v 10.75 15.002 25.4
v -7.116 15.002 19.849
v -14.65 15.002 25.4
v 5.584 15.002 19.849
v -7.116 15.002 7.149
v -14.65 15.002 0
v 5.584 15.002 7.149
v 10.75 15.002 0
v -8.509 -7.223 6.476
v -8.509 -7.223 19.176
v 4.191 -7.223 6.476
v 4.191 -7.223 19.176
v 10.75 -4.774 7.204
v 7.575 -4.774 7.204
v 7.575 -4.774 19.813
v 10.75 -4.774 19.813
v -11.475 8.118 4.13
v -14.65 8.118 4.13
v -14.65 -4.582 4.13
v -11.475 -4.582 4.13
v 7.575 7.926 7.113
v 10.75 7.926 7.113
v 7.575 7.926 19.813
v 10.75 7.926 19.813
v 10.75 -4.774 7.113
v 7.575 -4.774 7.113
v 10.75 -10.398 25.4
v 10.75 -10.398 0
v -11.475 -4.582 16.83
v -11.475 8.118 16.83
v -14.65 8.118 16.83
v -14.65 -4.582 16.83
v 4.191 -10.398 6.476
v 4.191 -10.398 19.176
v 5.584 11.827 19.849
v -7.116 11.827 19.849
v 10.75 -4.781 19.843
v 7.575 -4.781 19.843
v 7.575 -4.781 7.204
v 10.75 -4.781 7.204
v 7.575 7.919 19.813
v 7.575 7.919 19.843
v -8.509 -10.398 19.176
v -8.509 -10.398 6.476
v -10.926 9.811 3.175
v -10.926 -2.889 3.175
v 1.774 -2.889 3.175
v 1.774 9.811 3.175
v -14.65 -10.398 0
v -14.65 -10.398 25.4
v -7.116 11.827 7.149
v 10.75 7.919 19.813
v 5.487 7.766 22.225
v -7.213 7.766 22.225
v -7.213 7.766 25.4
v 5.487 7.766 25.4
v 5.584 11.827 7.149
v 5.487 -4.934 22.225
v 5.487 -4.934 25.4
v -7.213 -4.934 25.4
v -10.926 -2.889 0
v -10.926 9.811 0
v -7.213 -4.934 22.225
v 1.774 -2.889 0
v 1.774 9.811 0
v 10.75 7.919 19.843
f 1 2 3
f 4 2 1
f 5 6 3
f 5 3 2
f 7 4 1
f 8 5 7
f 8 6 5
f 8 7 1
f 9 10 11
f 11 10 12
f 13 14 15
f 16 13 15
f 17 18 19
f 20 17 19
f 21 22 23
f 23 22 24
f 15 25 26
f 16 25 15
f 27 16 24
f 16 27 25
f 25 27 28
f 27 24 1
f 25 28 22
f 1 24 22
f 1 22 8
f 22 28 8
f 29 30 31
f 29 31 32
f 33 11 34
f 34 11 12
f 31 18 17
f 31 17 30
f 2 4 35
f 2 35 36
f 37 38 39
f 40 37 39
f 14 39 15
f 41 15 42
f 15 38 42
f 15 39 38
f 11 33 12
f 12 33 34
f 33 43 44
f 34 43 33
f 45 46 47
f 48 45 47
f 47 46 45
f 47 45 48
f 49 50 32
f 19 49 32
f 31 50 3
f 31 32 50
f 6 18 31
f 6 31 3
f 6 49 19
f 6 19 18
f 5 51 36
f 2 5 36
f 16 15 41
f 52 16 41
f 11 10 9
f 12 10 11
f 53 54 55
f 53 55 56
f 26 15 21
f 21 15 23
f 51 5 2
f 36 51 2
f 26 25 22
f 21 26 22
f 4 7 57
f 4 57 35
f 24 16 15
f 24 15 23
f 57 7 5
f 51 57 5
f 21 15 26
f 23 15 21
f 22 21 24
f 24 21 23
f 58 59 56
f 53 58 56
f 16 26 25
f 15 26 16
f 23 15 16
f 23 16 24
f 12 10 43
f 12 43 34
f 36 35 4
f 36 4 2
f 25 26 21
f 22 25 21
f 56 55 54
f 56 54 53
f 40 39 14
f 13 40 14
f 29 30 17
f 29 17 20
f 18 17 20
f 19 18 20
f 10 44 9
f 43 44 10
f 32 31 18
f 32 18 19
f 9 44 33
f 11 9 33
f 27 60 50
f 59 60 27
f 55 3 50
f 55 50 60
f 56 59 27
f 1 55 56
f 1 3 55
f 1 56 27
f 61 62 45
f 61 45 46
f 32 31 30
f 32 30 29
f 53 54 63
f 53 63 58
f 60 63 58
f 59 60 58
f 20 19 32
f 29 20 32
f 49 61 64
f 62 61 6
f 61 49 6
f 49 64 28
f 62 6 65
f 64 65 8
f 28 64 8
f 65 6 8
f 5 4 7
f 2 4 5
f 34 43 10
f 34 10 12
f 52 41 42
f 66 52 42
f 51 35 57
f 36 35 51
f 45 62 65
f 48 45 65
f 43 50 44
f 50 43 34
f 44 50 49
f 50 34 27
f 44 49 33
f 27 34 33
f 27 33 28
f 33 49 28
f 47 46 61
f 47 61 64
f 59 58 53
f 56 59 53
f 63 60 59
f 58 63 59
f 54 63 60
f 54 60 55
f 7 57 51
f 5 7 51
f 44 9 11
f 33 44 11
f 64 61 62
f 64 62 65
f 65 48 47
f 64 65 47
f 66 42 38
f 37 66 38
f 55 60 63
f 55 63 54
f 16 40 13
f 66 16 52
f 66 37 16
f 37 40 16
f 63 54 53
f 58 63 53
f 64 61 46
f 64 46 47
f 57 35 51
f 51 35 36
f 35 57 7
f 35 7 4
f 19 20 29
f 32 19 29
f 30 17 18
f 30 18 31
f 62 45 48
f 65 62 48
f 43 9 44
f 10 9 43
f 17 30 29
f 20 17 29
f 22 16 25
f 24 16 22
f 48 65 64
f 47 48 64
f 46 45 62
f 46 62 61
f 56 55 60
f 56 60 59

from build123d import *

# Parameters (mm, degrees)
F0_W      = 25.4
F0_H      = 25.4
F1_DEPTH  = 25.4
F2_W      = 12.7
F2_H      = 12.7
F3_DEPTH  = 3.175
F4_W      = 12.7
F4_H      = 12.7
F5_DEPTH  = 3.175
F6_W      = 12.7
F6_H      = 12.7
F7_DEPTH  = 3.175
F8_W      = 12.7
F8_H      = 12.7
F9_DEPTH  = 3.175
F10_W     = 12.7
F10_H     = 12.7
F11_DEPTH = 3.175
F12_W     = 12.7
F12_H     = 12.7
F13_DEPTH = 3.175
F15_DEPTH = 3.175
F16_W     = 12.7
F16_H     = 12.7
F17_DEPTH = 3.175
F18_W     = 12.7
F18_H     = 12.7
F19_DEPTH = 3.175
F20_W     = 12.7
F20_H     = 12.7
F21_DEPTH = 3.175
F22_W     = 12.7
F22_H     = 12.7
F23_DEPTH = 3.175
F24_W     = 12.7
F24_H     = 12.7
F25_DEPTH = 3.175
F26_W     = 12.7
F26_H     = 12.7
F27_DEPTH = 3.175


with BuildPart() as f1:
    # F0 (on Top) → F1 (new body)
    with BuildSketch(Plane.XY):
        with Locations((-1.9504367398, 2.3024473339)):
            Rectangle(F0_W, F0_H)
    extrude(amount=F1_DEPTH)

    # F2 (on face) → F3 (cut)
    with BuildSketch(Plane.XY.offset(25.4)):
        with Locations((-0.8634175174, 1.4158068735)):
            Rectangle(F2_W, F2_H)
    extrude(amount=-F3_DEPTH, mode=Mode.SUBTRACT)

    # F4 (on face) → F5 (cut)
    with BuildSketch(Plane.XZ.offset(10.3975526661)):
        with Locations((-2.158543095, 12.826214382)):
            Rectangle(F4_W, F4_H)
    extrude(amount=-F5_DEPTH, mode=Mode.SUBTRACT)

    # F6 (on face) → F7 (cut)
    with BuildSketch(Plane(origin=(-14.6504367398, 0, 0), x_dir=(0, -1, 0), z_dir=(-1, 0, 0))):
        with Locations((-1.7675558338, 10.4799354449)):
            Rectangle(F6_W, F6_H)
    extrude(amount=-F7_DEPTH, mode=Mode.SUBTRACT)

    # F8 (on face) → F9 (cut)
    with BuildSketch(Plane.YZ.offset(10.7495632602)):
        with Locations((1.576210605, 13.4627558291)):
            Rectangle(F8_W, F8_H)
    extrude(amount=-F9_DEPTH, mode=Mode.SUBTRACT)

    # F10 (on face) → F11 (cut)
    with BuildSketch(Plane(origin=(0, 0, 0), x_dir=(1, 0, 0), z_dir=(0, 0, -1))):
        with Locations((-4.5761787333, -3.4609017894)):
            Rectangle(F10_W, F10_H)
    extrude(amount=-F11_DEPTH, mode=Mode.SUBTRACT)

    # F12 (on face) → F13 (cut)
    with BuildSketch(Plane(origin=(0, 15.0024473339, 0), x_dir=(-1, 0, 0), z_dir=(0, 1, 0))):
        with Locations((0.7663230645, 13.4986708872)):
            Rectangle(F12_W, F12_H)
    extrude(amount=-F13_DEPTH, mode=Mode.SUBTRACT)


with BuildPart() as f15:
    # F14 (on face) → F15 (new body)
    with BuildSketch(Plane.YZ.offset(7.5745632602)):
        Polygon((7.9185329378, 19.842589274), (-4.781419877, 19.842589274), (-4.781419877, 7.2042862885), (-4.773789395, 7.2042862885), (-4.773789395, 19.8127558291), (7.9185329378, 19.8127558291), align=None)
    extrude(amount=F15_DEPTH)


with BuildPart() as f17:
    # F16 (on face) → F17 (new body)
    with BuildSketch(Plane.XY.offset(22.225)):
        with Locations((-0.8634175174, 1.4158068735)):
            Rectangle(F16_W, F16_H)
    extrude(amount=F17_DEPTH)


with BuildPart() as f19:
    # F18 (on face) → F19 (new body)
    with BuildSketch(Plane.YZ.offset(7.5745632602)):
        with Locations((1.576210605, 13.4627558291)):
            Rectangle(F18_W, F18_H)
    extrude(amount=F19_DEPTH)


with BuildPart() as f21:
    # F20 (on face) → F21 (new body)
    with BuildSketch(Plane.XZ.offset(7.2225526661)):
        with Locations((-2.158543095, 12.826214382)):
            Rectangle(F20_W, F20_H)
    extrude(amount=F21_DEPTH)


with BuildPart() as f23:
    # F22 (on face) → F23 (new body)
    with BuildSketch(Plane(origin=(-11.4754367398, 0, 0), x_dir=(0, -1, 0), z_dir=(-1, 0, 0))):
        with Locations((-1.7675558338, 10.4799354449)):
            Rectangle(F22_W, F22_H)
    extrude(amount=F23_DEPTH)


with BuildPart() as f25:
    # F24 (on face) → F25 (new body)
    with BuildSketch(Plane(origin=(0, 11.8274473339, 0), x_dir=(-1, 0, 0), z_dir=(0, 1, 0))):
        with Locations((0.7663230645, 13.4986708872)):
            Rectangle(F24_W, F24_H)
    extrude(amount=F25_DEPTH)


with BuildPart() as f27:
    # F26 (on face) → F27 (new body)
    with BuildSketch(Plane(origin=(0, 0, 3.175), x_dir=(1, 0, 0), z_dir=(0, 0, -1))):
        with Locations((-4.5761787333, -3.4609017894)):
            Rectangle(F26_W, F26_H)
    extrude(amount=F27_DEPTH)


solid = Compound([f1.part, f15.part, f17.part, f19.part, f21.part, f23.part, f25.part, f27.part])
